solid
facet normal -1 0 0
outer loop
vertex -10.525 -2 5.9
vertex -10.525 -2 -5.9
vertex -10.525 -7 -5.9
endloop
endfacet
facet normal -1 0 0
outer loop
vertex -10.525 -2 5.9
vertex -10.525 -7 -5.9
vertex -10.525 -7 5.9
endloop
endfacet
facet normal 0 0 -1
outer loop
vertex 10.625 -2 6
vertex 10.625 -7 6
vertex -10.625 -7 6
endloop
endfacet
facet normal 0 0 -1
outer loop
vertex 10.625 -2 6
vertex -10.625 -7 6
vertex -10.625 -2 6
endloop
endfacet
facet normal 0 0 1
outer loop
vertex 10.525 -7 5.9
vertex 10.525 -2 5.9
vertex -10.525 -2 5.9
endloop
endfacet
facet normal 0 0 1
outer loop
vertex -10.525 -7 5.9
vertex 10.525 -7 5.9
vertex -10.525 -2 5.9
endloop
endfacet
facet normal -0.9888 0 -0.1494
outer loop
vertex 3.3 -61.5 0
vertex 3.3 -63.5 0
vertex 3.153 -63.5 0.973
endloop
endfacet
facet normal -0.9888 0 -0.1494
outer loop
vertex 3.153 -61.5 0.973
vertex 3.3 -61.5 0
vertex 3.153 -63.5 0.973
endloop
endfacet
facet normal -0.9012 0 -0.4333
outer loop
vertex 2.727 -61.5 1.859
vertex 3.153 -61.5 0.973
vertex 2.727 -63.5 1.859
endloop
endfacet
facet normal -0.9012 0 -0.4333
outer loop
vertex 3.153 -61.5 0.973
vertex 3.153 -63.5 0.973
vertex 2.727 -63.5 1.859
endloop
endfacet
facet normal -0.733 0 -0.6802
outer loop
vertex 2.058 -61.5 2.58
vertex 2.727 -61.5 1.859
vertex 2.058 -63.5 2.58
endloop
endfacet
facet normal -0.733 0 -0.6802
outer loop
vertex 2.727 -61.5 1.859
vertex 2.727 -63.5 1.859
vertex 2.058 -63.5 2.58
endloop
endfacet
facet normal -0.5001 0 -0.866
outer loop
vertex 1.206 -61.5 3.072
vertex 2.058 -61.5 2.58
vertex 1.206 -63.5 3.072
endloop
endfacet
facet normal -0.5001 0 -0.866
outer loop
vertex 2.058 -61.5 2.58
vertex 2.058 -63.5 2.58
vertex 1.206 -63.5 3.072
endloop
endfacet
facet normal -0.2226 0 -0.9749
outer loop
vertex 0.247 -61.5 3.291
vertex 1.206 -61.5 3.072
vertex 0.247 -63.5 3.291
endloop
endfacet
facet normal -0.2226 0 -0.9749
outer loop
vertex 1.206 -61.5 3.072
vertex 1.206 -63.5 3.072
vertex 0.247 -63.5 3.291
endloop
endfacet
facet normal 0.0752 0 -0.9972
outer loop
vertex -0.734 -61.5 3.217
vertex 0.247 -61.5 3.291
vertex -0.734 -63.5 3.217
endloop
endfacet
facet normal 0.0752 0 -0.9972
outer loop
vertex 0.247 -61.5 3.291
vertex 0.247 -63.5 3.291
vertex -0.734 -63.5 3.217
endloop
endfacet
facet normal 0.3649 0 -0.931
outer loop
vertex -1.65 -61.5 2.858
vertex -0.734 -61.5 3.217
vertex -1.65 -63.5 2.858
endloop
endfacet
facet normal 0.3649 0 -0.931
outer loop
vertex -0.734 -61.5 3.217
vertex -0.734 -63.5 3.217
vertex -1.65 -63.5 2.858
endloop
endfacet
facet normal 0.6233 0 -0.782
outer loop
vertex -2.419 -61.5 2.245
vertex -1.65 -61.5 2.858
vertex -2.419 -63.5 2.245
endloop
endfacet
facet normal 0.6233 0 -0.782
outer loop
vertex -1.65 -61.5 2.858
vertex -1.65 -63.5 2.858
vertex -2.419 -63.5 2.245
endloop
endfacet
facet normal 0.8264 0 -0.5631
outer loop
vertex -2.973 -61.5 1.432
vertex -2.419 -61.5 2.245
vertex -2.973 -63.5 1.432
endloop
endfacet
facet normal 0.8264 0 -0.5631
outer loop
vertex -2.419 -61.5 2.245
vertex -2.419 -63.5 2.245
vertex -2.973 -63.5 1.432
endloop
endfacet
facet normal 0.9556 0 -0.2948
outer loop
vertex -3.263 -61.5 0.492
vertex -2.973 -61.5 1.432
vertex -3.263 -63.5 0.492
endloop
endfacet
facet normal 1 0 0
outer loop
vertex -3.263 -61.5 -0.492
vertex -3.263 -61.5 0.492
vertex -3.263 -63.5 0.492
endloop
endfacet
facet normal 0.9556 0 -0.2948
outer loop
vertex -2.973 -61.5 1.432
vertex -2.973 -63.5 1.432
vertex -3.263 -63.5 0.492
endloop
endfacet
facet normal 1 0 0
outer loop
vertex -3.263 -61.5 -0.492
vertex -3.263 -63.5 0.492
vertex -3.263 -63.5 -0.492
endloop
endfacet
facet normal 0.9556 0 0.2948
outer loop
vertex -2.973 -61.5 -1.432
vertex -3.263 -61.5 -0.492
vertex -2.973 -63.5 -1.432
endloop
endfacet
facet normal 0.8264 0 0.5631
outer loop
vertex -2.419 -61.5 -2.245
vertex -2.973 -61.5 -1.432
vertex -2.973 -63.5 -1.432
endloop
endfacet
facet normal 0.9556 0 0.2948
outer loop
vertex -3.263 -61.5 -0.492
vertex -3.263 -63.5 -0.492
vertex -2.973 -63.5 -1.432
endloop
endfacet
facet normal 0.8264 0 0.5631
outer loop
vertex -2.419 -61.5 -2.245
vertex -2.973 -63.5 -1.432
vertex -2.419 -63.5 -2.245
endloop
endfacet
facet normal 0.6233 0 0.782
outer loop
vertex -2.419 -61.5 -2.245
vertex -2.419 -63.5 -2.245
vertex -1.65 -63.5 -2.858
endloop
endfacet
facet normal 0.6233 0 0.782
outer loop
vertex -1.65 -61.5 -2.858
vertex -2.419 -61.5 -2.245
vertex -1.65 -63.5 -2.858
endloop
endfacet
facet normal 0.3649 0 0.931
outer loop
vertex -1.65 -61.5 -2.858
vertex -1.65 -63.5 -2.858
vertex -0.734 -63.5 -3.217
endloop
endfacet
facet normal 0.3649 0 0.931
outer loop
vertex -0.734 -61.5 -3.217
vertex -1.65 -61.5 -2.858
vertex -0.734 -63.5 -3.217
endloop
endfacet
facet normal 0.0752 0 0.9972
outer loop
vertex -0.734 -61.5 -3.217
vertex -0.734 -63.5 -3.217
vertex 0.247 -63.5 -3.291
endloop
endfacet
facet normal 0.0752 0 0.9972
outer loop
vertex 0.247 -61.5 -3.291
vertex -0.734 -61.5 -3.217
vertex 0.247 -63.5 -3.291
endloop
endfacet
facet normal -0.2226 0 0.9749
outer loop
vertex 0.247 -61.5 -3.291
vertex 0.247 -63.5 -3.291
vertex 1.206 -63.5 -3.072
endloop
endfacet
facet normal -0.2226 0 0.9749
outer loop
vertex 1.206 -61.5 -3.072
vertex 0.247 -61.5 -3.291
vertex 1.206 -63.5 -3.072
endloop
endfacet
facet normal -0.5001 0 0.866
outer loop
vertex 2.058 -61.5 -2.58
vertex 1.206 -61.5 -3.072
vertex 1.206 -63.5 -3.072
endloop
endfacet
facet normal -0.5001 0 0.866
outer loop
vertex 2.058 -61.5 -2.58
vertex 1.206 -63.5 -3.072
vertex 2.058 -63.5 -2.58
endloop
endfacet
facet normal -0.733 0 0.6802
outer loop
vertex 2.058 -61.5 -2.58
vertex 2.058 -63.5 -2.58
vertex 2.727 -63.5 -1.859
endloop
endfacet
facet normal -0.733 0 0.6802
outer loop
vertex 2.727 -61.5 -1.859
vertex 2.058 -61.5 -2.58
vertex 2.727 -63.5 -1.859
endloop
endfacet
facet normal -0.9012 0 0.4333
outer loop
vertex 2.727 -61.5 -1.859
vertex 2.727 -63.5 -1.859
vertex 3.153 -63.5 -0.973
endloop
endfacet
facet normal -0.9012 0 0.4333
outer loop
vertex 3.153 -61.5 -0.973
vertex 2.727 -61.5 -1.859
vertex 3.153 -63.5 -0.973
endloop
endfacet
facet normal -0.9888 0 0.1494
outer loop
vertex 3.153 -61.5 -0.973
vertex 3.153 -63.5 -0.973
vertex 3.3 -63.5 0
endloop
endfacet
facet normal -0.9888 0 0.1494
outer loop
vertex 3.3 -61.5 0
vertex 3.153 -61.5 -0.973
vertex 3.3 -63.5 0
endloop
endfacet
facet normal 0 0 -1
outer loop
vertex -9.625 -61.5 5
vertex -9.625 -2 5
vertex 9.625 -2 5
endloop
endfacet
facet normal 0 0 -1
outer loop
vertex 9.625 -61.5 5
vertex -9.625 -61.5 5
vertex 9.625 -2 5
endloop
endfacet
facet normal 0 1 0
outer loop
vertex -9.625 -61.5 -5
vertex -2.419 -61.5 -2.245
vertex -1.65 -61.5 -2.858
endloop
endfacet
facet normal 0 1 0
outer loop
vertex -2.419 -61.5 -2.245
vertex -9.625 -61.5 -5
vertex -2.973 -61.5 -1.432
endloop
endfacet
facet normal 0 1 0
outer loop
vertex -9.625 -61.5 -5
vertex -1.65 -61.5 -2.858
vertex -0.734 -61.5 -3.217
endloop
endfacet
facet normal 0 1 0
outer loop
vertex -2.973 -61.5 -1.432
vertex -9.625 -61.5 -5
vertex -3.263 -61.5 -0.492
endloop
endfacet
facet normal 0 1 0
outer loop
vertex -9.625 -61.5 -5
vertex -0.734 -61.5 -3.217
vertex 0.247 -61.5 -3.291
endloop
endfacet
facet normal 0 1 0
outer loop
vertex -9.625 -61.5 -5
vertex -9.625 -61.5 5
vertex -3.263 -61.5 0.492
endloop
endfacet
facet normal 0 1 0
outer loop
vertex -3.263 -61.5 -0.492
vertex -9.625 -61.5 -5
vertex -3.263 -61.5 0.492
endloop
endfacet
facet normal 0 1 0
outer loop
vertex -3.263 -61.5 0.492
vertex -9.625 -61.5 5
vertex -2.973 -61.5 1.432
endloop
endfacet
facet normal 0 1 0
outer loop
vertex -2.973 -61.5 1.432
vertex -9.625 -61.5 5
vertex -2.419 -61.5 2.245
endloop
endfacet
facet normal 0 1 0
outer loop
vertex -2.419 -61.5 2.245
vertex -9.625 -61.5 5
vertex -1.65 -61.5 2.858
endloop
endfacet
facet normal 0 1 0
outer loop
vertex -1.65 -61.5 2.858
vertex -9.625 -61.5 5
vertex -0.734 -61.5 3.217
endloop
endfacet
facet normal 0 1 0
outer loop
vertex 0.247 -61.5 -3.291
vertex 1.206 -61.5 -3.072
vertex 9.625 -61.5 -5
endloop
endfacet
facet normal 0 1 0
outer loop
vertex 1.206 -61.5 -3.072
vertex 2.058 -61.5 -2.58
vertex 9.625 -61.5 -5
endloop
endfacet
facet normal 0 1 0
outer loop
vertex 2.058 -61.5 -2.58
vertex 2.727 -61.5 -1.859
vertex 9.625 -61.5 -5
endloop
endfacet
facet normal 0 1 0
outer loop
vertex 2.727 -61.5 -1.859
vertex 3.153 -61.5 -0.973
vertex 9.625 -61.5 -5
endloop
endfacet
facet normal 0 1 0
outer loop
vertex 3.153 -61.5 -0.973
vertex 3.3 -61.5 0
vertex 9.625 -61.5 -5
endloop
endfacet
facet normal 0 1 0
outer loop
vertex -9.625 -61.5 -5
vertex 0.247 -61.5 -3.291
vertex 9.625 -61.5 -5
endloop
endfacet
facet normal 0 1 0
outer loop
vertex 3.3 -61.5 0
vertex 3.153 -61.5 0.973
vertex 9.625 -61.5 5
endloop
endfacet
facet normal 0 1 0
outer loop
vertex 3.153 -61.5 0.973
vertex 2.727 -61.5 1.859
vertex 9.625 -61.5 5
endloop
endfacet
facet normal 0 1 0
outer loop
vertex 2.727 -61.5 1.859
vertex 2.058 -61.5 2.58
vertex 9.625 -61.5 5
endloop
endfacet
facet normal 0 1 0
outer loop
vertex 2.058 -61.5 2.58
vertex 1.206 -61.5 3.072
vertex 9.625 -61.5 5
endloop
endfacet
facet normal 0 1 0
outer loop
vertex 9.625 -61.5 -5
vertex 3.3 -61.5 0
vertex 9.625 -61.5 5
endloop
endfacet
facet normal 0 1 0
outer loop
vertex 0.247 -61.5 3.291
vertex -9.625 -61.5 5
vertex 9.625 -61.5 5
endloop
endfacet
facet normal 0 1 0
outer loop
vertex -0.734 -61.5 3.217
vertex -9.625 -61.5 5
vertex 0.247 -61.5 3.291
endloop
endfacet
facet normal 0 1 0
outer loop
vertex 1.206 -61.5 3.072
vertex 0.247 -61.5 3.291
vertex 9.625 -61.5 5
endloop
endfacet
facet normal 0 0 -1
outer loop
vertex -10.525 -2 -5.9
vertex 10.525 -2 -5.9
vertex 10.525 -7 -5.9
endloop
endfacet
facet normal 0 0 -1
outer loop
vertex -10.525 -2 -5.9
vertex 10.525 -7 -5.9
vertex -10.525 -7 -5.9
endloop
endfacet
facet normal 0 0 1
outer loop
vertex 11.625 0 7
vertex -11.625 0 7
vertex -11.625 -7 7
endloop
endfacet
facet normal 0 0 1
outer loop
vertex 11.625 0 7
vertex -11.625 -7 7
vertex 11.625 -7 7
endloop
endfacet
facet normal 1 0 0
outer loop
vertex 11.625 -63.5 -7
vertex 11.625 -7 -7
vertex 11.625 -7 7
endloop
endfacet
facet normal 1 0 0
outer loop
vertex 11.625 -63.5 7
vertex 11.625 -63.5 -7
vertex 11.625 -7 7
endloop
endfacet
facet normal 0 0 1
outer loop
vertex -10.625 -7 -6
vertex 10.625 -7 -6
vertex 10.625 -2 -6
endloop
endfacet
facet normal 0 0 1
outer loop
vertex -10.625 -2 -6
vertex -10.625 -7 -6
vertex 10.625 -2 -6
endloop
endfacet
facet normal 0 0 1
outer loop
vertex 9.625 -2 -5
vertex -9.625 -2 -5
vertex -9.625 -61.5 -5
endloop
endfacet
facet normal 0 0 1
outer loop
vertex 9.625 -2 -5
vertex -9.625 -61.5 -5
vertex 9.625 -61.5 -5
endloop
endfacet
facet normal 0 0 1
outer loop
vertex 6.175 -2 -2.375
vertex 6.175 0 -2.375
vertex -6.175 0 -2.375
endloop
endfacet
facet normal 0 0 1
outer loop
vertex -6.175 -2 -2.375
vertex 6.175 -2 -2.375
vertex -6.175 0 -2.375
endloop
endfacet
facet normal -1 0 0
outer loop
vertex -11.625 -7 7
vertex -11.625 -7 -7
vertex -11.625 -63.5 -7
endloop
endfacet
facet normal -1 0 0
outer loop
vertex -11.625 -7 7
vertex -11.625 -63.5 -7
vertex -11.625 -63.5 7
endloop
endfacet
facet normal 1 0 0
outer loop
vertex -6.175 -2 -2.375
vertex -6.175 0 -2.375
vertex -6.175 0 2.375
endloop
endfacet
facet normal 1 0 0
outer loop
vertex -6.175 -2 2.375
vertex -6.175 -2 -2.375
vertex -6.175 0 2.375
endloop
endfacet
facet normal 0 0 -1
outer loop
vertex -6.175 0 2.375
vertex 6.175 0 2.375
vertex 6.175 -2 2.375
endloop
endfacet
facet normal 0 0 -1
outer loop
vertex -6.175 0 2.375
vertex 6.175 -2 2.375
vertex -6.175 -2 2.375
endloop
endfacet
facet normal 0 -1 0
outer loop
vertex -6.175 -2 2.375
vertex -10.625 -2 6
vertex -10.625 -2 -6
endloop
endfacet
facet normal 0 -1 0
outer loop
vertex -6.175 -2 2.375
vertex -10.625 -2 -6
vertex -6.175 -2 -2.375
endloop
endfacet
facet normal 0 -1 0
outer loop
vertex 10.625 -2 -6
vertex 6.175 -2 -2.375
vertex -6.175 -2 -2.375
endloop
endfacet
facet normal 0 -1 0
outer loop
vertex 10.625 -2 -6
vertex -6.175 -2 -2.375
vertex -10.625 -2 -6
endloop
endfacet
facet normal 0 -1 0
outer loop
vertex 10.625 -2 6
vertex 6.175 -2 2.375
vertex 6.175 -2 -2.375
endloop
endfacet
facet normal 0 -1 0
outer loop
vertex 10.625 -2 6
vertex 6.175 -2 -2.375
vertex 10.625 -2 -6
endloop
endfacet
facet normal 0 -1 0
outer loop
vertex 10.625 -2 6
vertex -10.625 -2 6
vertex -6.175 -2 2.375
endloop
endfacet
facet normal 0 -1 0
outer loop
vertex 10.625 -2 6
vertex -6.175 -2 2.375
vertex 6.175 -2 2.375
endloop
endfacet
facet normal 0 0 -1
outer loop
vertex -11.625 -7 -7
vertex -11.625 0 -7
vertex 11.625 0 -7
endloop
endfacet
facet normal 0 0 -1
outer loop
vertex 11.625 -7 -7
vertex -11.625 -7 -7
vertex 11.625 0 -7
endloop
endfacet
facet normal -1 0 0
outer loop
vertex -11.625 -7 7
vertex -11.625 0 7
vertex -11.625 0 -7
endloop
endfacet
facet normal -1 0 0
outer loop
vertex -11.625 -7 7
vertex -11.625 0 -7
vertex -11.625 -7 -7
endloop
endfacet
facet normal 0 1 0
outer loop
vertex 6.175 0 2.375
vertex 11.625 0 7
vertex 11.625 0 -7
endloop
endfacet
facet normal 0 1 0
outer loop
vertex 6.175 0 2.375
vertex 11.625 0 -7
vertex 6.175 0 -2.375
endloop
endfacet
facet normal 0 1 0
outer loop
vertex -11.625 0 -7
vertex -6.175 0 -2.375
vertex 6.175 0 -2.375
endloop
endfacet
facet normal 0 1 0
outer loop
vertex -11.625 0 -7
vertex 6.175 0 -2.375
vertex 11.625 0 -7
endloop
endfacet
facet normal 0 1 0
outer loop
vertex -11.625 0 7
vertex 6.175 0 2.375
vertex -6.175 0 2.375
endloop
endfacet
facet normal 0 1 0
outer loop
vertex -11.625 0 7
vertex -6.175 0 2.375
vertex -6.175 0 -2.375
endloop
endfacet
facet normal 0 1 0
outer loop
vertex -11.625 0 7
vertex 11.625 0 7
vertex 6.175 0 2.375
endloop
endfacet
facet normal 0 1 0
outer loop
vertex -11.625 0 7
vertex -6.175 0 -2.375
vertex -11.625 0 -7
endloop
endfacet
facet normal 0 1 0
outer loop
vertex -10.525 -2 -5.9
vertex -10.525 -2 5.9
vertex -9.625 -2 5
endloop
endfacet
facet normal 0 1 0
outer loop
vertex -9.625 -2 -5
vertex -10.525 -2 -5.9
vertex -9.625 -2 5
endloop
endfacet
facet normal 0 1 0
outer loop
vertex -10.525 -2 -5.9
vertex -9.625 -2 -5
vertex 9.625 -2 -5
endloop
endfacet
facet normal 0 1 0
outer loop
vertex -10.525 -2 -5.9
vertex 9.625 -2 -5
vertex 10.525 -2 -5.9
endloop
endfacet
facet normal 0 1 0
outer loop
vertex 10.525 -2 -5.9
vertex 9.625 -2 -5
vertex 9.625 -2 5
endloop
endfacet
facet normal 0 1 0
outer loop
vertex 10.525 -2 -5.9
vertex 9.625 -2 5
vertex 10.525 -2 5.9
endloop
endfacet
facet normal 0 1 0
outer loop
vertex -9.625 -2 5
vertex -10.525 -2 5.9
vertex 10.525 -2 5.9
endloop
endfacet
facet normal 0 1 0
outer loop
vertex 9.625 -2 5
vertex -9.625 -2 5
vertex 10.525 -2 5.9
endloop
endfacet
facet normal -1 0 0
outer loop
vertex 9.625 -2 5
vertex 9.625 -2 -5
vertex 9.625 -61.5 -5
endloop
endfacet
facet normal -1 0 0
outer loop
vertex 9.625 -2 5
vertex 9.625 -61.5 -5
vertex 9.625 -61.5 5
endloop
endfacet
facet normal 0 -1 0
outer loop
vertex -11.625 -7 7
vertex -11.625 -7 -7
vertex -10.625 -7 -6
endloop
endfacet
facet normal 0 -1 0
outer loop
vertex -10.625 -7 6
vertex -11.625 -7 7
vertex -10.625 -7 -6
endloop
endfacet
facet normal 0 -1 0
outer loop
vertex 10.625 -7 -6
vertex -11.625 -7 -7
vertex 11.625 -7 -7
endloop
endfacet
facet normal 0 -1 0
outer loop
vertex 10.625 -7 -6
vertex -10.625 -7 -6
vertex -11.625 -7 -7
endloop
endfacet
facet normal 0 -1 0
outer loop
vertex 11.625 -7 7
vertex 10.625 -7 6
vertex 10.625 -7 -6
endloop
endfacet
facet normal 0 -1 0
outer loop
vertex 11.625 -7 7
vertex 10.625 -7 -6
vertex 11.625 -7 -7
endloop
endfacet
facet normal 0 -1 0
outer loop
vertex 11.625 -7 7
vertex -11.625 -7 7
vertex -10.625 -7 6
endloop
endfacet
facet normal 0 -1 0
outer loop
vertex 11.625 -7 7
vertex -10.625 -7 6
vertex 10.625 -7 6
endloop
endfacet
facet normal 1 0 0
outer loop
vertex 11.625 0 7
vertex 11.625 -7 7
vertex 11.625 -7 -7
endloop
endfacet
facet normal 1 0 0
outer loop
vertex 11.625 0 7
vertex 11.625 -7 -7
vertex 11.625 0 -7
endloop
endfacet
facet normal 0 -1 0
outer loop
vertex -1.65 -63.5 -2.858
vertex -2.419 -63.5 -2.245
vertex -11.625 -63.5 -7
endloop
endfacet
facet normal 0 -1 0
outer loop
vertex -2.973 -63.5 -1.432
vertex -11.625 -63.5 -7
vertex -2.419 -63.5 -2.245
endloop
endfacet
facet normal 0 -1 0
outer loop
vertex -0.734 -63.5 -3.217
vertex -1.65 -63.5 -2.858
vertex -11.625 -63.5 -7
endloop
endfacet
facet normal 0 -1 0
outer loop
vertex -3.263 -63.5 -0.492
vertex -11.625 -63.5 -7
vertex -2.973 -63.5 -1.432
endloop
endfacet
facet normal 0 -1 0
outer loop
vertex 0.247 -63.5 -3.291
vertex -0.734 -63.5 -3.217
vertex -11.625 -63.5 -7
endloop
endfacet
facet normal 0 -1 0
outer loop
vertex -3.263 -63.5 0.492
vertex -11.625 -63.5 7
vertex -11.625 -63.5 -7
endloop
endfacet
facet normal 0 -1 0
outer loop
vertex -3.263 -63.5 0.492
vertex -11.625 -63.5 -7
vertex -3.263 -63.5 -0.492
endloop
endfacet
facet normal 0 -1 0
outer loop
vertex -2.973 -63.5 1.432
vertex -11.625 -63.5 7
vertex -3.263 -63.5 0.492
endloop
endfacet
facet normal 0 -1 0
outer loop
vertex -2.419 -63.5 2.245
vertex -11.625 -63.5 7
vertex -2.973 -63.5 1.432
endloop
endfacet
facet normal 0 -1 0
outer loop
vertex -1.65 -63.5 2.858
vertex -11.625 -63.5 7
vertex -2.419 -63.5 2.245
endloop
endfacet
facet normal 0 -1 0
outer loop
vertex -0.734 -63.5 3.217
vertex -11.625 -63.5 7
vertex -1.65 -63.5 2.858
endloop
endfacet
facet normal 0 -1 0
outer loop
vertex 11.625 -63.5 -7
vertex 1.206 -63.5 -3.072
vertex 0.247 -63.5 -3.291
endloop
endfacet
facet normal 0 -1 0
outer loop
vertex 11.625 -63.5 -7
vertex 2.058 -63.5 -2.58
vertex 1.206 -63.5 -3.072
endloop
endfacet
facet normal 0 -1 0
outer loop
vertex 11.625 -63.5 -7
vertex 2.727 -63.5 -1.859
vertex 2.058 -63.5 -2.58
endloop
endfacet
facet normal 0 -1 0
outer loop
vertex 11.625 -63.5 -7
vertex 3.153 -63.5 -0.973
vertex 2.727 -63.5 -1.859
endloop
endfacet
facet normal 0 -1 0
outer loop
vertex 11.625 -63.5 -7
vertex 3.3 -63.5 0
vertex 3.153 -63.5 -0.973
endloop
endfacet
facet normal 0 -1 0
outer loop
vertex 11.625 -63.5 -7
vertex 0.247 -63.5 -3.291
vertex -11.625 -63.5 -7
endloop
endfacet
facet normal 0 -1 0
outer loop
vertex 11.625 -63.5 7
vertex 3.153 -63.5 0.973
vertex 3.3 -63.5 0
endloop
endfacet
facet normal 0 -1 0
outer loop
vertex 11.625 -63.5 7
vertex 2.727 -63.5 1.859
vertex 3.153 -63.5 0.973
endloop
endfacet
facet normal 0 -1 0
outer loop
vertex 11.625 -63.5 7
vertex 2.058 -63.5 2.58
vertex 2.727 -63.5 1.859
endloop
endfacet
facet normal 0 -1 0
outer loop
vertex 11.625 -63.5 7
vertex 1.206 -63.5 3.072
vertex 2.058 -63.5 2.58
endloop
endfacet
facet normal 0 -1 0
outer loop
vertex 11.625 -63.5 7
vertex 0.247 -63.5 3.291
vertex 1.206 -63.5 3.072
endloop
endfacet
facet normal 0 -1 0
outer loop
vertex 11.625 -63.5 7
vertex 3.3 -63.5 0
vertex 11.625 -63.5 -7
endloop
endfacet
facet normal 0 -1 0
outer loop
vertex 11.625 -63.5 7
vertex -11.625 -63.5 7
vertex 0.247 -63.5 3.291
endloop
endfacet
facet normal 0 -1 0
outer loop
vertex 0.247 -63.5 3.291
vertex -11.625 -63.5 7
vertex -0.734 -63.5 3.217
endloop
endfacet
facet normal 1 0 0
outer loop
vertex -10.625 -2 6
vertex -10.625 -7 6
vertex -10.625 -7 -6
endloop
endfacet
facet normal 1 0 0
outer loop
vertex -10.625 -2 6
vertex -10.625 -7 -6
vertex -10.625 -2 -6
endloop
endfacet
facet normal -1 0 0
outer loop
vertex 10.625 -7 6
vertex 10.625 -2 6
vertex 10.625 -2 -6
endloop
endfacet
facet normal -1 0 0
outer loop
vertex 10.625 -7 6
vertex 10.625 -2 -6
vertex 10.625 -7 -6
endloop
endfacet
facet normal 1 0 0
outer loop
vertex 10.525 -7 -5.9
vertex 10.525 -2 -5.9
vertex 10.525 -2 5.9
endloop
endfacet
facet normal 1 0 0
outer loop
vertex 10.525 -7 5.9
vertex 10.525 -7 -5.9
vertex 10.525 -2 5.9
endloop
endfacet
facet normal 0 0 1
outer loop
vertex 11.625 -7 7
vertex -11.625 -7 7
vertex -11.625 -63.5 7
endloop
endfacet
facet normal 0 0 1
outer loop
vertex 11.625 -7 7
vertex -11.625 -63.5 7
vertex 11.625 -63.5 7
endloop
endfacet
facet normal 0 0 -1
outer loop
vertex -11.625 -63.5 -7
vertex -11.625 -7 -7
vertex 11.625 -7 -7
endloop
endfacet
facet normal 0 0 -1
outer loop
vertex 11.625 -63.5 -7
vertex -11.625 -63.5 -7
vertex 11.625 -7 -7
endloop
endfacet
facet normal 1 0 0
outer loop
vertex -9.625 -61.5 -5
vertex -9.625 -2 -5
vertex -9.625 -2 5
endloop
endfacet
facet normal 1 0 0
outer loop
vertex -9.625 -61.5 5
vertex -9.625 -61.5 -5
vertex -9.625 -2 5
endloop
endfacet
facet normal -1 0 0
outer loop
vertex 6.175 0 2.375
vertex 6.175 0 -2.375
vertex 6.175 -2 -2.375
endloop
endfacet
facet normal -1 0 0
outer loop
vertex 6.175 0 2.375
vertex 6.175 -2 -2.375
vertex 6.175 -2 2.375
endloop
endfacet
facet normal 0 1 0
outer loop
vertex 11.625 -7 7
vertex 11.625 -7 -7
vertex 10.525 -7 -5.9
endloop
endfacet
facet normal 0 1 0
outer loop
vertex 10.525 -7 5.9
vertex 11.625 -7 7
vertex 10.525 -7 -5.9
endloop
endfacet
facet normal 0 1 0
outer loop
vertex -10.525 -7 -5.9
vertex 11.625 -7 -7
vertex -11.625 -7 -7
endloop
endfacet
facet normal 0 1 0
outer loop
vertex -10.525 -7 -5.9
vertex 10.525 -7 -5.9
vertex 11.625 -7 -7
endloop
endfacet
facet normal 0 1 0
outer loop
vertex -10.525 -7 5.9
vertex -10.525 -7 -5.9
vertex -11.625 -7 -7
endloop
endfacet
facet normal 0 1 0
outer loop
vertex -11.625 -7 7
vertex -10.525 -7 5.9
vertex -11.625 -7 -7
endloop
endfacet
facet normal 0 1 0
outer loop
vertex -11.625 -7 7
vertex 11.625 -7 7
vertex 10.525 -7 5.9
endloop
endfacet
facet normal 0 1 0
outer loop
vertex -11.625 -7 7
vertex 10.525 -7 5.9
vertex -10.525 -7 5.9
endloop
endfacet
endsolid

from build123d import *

# Parameters (mm, degrees)
PAD003_DEPTH      = 7
PAD003_DEPTH_BACK = 7
SKETCH004_W       = 7
SKETCH004_H       = 1
PAD004_DEPTH      = 23.250027
SKETCH005_W       = 12.35
SKETCH005_H       = 4.75
POCKET_DEPTH      = 7.001
SKETCH007_W       = 23.25
SKETCH007_H       = 14
PAD005_DEPTH      = 61.5
THICKNESS_T       = -2
SKETCH008_W       = 23.25
SKETCH008_H       = 14
SKETCH008_W_2     = 21.05
SKETCH008_H_2     = 11.8
POCKET001_DEPTH   = 5
SKETCH009_R       = 3.3
POCKET002_DEPTH   = 61.501


with BuildPart() as usb:
    # Sketch003 → Pad003 (new body, two sides)
    with BuildSketch(Plane.XY) as pad003_sk:
        Polygon((11.625027, 0), (-11.625, 0), (-11.625, -7), (-10.625, -7), (-10.625, -2), (10.625, -2), (10.625027, -7), (11.625027, -7), align=None)
    extrude(amount=PAD003_DEPTH)
    extrude(pad003_sk.sketch, amount=-PAD003_DEPTH_BACK)

    # Sketch004 (on Face4 of Pad003) → Pad004 (join)
    with BuildSketch(Plane.YZ.offset(11.625027)):
        with Locations((-3.5, 6.5)):
            Rectangle(SKETCH004_W, SKETCH004_H)
        with Locations((-3.5, -6.5)):
            Rectangle(SKETCH004_W, SKETCH004_H)
    extrude(amount=-PAD004_DEPTH)

    # Sketch005 (on Face9 of Pad004) → Pocket (cut, through all)
    with BuildSketch(Plane(origin=(0, 0, 0), x_dir=(-1, 0, 0), z_dir=(0, 1, 0))):
        Rectangle(SKETCH005_W, SKETCH005_H)
    extrude(amount=-POCKET_DEPTH, mode=Mode.SUBTRACT)


with BuildPart() as body004:
    # Sketch007 → Pad005 (new body)
    with BuildSketch(Plane.XZ.offset(2)):
        Rectangle(SKETCH007_W, SKETCH007_H)
    extrude(amount=PAD005_DEPTH)

    # Thickness
    thickness_openings = [body004.faces().sort_by_distance(p)[0] for p in [
        (0, -2, 0),
    ]]
    offset(amount=THICKNESS_T, openings=thickness_openings, kind=Kind.INTERSECTION)

    # Sketch008 (on Face6 of Thickness) → Pocket001 (cut)
    with BuildSketch(Plane(origin=(0, -2, 0), x_dir=(-1, 0, 0), z_dir=(0, 1, 0))):
        Rectangle(SKETCH008_W, SKETCH008_H)
        Rectangle(SKETCH008_W_2, SKETCH008_H_2, mode=Mode.SUBTRACT)
    extrude(amount=-POCKET001_DEPTH, mode=Mode.SUBTRACT)

    # Sketch009 (on Face4 of Pocket001) → Pocket002 (cut, through all)
    with BuildSketch(Plane.XZ.offset(63.5)):
        Circle(SKETCH009_R)
    extrude(amount=-POCKET002_DEPTH, mode=Mode.SUBTRACT)


solid = Compound([usb.part, body004.part])
